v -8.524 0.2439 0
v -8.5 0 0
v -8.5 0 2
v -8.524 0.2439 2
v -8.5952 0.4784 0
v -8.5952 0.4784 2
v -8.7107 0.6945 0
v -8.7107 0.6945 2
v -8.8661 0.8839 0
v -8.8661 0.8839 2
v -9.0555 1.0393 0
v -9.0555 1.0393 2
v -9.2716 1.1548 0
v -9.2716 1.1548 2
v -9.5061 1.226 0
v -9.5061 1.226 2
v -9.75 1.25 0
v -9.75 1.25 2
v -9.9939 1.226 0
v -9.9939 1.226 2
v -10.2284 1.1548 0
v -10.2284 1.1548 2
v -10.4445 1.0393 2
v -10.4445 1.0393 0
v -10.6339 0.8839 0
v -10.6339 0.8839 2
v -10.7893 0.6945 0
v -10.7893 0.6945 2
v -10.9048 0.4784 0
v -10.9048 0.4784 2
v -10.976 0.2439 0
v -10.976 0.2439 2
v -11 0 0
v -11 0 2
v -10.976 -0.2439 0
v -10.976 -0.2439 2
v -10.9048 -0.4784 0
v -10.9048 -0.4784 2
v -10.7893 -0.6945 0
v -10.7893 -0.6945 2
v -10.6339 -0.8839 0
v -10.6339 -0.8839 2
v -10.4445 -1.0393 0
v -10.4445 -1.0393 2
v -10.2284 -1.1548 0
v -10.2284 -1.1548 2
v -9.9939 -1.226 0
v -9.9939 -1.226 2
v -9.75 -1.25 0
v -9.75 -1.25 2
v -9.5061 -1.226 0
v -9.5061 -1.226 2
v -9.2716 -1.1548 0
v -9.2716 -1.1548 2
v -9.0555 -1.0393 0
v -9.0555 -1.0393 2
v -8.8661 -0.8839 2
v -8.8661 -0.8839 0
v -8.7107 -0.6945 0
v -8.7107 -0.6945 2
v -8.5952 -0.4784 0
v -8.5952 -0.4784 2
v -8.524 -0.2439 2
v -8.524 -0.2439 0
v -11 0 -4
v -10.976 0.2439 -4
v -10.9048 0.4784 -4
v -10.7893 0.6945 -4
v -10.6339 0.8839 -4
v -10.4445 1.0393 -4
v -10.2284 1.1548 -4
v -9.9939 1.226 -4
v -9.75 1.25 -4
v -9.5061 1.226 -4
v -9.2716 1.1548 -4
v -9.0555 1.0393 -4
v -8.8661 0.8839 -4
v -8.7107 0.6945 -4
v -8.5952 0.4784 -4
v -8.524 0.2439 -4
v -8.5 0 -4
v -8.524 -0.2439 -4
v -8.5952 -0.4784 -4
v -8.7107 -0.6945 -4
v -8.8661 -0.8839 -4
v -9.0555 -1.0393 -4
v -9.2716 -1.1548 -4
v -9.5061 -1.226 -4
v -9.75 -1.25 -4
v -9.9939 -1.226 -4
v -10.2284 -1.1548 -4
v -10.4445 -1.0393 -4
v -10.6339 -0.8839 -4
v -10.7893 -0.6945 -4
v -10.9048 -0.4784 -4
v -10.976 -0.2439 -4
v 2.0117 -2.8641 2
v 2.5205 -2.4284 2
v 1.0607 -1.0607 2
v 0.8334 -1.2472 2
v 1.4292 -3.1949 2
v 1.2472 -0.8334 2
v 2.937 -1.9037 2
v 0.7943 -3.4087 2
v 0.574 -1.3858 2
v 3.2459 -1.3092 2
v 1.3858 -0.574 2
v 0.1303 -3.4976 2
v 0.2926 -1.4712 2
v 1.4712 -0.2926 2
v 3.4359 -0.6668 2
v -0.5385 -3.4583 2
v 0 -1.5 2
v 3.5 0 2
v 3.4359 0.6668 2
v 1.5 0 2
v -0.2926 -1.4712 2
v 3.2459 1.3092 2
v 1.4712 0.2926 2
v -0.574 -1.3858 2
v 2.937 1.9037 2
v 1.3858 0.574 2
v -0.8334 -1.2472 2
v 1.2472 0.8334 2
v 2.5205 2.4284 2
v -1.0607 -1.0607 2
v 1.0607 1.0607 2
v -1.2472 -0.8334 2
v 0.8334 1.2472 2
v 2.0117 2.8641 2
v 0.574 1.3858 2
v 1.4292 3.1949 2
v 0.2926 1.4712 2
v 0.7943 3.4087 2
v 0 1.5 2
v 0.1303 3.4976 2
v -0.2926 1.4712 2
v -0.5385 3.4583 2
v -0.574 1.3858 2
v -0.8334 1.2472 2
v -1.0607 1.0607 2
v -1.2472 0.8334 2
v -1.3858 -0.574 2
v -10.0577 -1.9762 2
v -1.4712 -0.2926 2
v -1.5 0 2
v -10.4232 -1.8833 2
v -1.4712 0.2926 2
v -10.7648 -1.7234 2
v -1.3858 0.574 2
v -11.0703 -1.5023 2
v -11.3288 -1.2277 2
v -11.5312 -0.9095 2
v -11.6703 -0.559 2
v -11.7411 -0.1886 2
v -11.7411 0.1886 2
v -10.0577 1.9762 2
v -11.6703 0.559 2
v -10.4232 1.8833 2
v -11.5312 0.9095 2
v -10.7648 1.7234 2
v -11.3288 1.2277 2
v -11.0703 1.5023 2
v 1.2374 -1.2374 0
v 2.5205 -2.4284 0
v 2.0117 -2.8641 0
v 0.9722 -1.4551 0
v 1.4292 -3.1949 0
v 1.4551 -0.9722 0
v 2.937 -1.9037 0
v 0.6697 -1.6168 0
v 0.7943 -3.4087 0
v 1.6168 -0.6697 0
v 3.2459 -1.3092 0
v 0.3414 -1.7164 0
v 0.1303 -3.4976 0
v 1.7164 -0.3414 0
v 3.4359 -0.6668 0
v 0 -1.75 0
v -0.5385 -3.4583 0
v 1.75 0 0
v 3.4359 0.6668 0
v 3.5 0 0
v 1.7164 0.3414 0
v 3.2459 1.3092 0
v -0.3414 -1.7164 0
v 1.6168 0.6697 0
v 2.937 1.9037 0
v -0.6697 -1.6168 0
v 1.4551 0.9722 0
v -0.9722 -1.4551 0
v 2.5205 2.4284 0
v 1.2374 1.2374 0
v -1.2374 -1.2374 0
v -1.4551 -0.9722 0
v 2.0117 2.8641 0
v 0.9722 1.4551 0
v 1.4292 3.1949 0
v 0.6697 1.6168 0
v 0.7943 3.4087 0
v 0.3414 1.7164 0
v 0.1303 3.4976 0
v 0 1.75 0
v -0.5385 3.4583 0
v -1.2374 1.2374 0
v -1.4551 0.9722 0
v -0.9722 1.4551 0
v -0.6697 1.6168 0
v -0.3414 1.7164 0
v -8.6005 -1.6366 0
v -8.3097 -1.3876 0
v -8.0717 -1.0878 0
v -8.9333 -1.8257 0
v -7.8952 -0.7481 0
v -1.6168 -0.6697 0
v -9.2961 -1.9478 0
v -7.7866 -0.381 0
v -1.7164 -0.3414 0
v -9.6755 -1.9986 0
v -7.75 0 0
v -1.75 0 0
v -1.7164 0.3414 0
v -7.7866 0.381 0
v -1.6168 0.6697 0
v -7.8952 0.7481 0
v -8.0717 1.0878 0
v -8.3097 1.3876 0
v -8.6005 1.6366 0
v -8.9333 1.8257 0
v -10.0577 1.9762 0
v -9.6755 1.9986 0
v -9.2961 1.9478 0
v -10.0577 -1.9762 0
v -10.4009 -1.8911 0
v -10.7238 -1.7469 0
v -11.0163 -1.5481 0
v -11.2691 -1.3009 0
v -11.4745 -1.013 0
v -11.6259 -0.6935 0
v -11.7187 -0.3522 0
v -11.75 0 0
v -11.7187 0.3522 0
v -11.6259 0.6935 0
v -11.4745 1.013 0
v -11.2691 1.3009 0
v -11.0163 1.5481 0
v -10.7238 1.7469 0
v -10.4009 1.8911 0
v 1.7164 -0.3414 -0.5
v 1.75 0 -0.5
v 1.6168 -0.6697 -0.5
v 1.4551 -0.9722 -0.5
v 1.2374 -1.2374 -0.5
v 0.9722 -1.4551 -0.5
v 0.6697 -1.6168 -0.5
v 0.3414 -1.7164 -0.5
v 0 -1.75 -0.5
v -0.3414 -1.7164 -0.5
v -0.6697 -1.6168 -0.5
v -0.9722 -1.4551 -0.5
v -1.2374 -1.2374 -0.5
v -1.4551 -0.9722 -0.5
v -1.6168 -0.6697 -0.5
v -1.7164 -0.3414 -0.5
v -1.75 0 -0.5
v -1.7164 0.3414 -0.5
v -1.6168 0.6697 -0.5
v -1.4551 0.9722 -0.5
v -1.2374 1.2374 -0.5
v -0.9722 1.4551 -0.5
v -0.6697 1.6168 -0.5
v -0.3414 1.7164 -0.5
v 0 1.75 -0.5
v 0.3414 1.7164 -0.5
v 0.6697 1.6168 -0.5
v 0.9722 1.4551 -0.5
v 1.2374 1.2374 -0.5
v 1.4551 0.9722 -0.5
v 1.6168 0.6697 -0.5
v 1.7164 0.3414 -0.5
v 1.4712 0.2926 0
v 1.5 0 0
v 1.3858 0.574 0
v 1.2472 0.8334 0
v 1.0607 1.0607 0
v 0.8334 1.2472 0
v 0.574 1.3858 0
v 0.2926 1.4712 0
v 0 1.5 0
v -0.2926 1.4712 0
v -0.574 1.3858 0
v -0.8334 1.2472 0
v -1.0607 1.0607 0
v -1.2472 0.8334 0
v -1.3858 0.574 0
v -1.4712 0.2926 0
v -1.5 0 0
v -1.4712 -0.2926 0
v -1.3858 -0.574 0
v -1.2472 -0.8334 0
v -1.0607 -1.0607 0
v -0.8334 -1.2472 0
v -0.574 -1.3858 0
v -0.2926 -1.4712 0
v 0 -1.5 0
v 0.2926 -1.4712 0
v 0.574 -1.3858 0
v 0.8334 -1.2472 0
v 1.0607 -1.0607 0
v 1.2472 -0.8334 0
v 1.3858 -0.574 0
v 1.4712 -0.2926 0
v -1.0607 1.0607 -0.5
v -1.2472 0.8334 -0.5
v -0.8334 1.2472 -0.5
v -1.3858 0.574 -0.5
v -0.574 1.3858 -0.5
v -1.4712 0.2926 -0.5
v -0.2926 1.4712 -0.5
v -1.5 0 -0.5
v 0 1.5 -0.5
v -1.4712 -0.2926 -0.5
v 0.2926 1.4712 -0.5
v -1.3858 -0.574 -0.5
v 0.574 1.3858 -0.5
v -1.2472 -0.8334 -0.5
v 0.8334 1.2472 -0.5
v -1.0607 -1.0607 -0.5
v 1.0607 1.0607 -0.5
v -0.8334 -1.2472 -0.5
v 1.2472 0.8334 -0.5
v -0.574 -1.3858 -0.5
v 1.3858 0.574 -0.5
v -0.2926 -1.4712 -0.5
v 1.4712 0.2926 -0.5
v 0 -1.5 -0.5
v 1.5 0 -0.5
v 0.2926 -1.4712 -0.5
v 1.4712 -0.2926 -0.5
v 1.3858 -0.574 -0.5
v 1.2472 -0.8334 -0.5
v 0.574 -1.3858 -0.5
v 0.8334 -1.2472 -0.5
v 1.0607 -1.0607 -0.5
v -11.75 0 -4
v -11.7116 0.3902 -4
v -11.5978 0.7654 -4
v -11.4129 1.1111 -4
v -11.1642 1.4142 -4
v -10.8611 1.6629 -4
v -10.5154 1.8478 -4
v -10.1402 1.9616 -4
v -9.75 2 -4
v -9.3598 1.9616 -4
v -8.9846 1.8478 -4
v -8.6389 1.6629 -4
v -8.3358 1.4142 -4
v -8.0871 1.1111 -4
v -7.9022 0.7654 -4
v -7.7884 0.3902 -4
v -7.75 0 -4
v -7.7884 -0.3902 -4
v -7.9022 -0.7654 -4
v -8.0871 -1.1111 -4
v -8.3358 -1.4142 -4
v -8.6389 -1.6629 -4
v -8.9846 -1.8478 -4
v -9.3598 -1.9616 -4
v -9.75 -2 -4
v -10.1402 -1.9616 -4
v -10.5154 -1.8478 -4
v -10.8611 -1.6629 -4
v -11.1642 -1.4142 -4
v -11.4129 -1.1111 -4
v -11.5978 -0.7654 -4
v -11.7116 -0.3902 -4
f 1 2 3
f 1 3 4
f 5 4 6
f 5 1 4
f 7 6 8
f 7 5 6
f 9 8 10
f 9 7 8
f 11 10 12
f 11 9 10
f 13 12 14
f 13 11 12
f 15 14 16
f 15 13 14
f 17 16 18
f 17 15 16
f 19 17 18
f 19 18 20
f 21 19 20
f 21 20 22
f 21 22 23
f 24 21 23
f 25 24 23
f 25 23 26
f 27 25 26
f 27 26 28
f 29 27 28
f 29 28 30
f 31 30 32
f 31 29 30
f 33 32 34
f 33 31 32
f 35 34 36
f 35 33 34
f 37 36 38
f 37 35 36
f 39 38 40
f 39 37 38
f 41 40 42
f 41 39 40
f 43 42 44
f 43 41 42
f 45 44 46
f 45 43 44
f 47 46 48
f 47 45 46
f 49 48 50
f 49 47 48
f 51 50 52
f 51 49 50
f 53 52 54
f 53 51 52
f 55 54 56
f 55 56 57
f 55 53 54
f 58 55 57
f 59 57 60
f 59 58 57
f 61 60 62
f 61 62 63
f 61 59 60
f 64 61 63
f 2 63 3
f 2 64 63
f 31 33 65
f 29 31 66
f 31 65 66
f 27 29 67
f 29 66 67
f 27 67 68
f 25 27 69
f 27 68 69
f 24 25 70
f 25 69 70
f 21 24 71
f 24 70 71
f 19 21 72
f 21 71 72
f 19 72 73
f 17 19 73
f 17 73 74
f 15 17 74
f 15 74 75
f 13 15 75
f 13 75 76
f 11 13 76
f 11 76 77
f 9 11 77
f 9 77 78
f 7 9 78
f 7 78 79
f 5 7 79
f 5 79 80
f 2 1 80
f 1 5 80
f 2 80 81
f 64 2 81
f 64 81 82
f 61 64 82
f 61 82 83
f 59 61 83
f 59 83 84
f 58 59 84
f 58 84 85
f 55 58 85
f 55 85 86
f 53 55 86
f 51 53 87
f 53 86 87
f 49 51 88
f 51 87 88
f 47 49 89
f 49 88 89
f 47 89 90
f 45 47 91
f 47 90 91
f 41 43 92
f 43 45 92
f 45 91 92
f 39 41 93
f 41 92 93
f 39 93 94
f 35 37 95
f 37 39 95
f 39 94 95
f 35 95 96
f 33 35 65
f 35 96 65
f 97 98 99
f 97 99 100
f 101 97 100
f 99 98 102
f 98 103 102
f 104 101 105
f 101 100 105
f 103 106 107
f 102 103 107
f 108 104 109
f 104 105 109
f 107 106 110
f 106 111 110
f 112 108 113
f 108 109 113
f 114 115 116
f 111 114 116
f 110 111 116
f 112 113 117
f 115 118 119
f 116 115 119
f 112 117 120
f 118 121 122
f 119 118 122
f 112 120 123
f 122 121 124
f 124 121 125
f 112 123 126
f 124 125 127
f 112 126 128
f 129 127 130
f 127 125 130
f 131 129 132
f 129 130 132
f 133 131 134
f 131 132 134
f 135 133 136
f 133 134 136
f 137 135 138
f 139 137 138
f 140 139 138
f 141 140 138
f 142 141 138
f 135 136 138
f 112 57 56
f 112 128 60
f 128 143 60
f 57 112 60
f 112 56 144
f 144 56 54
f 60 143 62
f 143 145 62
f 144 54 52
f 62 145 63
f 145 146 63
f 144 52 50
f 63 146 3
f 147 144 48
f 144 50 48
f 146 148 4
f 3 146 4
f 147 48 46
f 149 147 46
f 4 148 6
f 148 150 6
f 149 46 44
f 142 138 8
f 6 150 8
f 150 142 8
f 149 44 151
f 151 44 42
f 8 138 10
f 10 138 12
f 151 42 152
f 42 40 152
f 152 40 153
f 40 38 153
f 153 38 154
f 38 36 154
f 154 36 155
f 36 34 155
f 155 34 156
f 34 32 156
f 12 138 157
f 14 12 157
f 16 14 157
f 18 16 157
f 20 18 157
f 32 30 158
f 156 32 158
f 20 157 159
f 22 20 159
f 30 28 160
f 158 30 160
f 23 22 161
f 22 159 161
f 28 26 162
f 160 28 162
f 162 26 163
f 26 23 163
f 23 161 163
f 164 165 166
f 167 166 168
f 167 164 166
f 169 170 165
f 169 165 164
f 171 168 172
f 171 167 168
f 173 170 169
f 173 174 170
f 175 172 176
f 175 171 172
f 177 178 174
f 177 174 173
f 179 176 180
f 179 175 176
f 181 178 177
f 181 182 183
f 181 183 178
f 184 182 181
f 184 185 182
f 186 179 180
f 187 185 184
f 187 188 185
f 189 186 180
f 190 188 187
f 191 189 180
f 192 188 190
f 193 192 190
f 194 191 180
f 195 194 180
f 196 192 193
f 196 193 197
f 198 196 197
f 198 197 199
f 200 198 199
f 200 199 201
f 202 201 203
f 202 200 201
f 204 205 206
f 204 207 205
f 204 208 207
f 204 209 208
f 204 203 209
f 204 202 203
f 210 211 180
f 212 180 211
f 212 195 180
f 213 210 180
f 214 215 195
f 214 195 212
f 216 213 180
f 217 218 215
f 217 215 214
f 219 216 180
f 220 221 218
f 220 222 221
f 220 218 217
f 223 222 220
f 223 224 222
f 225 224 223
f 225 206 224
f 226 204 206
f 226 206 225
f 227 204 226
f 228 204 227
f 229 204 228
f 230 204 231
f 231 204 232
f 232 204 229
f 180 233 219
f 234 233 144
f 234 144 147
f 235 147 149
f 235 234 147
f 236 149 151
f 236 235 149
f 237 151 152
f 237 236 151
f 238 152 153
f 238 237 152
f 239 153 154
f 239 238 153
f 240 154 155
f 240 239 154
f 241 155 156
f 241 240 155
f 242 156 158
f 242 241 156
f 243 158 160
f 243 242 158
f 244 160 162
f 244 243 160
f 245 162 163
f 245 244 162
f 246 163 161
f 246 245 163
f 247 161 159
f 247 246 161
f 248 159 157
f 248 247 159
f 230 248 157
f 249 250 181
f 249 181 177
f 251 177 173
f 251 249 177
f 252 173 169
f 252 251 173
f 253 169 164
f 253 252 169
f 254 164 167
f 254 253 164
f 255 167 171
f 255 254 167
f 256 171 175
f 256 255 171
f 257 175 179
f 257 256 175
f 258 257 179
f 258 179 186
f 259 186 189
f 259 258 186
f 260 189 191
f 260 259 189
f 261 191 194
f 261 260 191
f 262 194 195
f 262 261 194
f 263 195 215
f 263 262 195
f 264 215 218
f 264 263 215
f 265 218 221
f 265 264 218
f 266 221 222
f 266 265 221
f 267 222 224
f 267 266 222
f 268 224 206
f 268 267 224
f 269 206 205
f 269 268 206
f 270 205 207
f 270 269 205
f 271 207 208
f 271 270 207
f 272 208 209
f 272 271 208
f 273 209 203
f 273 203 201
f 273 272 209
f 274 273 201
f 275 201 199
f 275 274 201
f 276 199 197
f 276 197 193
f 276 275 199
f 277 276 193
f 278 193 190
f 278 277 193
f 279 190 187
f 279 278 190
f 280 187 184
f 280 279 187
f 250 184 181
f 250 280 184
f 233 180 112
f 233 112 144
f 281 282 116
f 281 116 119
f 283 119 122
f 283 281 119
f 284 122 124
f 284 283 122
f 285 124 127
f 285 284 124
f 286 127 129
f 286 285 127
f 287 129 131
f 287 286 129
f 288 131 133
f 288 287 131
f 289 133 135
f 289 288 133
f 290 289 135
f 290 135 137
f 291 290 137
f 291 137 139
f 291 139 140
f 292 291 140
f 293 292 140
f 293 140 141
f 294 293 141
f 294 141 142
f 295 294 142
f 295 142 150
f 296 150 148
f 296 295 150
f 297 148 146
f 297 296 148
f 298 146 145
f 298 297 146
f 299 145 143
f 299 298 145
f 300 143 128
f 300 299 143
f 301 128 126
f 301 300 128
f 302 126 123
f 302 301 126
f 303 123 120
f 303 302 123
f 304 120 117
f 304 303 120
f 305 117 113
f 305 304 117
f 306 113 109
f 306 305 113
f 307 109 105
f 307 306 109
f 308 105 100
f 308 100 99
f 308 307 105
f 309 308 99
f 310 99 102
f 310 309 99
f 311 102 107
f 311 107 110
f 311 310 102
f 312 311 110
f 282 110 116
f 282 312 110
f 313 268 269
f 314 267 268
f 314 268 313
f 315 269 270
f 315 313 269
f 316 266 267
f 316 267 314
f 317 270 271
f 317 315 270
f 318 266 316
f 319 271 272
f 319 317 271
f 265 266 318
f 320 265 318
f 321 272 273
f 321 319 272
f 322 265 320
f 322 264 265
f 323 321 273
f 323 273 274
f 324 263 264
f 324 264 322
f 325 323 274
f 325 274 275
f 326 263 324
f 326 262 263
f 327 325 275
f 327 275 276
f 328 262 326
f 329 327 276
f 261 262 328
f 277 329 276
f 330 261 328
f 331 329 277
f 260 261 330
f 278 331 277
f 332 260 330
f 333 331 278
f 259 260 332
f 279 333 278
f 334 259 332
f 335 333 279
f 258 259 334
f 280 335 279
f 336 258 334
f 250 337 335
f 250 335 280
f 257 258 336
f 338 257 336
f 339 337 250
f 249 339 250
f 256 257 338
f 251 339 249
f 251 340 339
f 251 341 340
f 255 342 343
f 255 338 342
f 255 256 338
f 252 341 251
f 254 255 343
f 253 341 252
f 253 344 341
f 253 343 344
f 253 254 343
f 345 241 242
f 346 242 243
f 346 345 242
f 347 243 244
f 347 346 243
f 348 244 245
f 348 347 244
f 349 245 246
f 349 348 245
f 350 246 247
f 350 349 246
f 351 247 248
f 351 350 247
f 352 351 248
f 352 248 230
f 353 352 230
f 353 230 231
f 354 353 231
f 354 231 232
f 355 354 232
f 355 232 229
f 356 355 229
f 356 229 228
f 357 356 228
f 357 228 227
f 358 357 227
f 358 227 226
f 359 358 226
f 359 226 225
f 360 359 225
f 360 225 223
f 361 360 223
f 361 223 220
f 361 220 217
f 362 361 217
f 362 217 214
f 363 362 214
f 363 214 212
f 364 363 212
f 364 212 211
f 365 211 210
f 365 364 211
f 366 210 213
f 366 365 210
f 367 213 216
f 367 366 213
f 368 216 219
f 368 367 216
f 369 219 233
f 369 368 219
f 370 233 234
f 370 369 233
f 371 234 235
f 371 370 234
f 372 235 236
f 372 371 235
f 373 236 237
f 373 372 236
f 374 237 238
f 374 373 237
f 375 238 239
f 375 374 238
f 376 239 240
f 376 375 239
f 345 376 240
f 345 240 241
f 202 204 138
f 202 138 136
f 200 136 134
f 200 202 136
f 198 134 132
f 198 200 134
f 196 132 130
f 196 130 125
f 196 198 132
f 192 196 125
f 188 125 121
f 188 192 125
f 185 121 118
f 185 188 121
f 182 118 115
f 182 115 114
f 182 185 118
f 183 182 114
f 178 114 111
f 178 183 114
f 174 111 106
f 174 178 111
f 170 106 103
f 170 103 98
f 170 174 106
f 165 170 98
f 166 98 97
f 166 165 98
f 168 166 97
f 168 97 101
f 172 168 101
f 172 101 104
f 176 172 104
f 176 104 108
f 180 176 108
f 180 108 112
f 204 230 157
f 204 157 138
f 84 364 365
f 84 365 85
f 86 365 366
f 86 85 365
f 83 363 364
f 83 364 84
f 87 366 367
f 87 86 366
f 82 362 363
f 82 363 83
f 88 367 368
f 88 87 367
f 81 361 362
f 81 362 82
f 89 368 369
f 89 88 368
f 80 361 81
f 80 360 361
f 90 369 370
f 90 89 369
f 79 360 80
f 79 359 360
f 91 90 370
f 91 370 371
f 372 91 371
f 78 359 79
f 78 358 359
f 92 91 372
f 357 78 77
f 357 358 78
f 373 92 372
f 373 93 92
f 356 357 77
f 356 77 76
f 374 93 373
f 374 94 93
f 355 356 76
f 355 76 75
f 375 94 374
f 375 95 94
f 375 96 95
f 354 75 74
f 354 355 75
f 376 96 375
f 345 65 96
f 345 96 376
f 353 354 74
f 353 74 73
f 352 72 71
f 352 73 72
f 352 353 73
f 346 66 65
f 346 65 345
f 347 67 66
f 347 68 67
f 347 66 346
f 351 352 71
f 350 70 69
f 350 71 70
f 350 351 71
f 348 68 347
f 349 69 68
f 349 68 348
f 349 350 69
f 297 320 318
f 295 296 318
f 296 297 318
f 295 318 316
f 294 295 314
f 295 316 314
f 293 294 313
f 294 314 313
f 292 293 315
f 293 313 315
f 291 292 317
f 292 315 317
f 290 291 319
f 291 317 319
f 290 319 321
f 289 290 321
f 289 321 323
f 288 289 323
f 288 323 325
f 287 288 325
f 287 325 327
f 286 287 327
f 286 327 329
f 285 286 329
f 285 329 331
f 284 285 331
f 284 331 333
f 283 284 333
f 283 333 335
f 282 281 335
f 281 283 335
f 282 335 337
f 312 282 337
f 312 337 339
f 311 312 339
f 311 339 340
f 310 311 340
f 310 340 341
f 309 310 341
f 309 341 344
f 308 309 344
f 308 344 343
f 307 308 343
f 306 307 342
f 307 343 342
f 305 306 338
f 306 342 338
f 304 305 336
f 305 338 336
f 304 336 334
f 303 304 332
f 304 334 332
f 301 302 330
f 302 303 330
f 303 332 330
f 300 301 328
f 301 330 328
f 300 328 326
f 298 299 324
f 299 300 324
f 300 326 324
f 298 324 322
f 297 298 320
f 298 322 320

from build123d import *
from build123d.topology import SkipClean

# Parameters (mm, degrees)
ESQUISSE1_R        = 1.5
ESQUISSE1_R_2      = 1.25
BOSS_EXTRU_1_DEPTH = 2
BOSS_EXTRU_2_START = 4
ESQUISSE2_R        = 2
ESQUISSE2_R_2      = 1.25
BOSS_EXTRU_2_DEPTH = 4
BOSS_EXTRU_3_START = 0.5
ESQUISSE3_R        = 1.75
ESQUISSE3_R_2      = 1.5
BOSS_EXTRU_3_DEPTH = 0.5


with BuildPart() as part:
    # Esquisse1 → Boss.-Extru.1 (new body)
    with BuildSketch(Plane.XY):
        with BuildLine():
            Line((-10.057692308, 1.976189627), (-0.538461538, 3.458331848))
            ThreePointArc((-0.538461538, 3.458331848), (3.5, 0), (-0.538461538, -3.458331848))
            Line((-0.538461538, -3.458331848), (-10.057692308, -1.976189627))
            ThreePointArc((-10.057692308, -1.976189627), (-11.75, 0), (-10.057692308, 1.976189627))
        make_face()
        Circle(ESQUISSE1_R, mode=Mode.SUBTRACT)
        with Locations((-9.75, 0)):
            Circle(ESQUISSE1_R_2, mode=Mode.SUBTRACT)
    extrude(amount=BOSS_EXTRU_1_DEPTH)

    # Esquisse2 → Boss.-Extru.2 (add)
    with SkipClean():  # the faces are left unmerged after this step: merging them gives an invalid solid
        with BuildSketch(Plane(origin=(0, 0, 0), x_dir=(-1, 0, 0), z_dir=(0, 0, -1)).offset(BOSS_EXTRU_2_START)):
            with Locations((9.75, 0)):
                Circle(ESQUISSE2_R)
            with Locations((9.75, 0)):
                Circle(ESQUISSE2_R_2, mode=Mode.SUBTRACT)
        extrude(amount=-BOSS_EXTRU_2_DEPTH)

    # Esquisse3 → Boss.-Extru.3 (add)
    with SkipClean():  # the faces are left unmerged after this step: merging them gives an invalid solid
        with BuildSketch(Plane(origin=(0, 0, 0), x_dir=(-1, 0, 0), z_dir=(0, 0, -1)).offset(BOSS_EXTRU_3_START)):
            with Locations(Location((0, 0, 0), (0, 0, 180))):
                Circle(ESQUISSE3_R)
            Circle(ESQUISSE3_R_2, mode=Mode.SUBTRACT)
        extrude(amount=-BOSS_EXTRU_3_DEPTH)


solid = part.part
